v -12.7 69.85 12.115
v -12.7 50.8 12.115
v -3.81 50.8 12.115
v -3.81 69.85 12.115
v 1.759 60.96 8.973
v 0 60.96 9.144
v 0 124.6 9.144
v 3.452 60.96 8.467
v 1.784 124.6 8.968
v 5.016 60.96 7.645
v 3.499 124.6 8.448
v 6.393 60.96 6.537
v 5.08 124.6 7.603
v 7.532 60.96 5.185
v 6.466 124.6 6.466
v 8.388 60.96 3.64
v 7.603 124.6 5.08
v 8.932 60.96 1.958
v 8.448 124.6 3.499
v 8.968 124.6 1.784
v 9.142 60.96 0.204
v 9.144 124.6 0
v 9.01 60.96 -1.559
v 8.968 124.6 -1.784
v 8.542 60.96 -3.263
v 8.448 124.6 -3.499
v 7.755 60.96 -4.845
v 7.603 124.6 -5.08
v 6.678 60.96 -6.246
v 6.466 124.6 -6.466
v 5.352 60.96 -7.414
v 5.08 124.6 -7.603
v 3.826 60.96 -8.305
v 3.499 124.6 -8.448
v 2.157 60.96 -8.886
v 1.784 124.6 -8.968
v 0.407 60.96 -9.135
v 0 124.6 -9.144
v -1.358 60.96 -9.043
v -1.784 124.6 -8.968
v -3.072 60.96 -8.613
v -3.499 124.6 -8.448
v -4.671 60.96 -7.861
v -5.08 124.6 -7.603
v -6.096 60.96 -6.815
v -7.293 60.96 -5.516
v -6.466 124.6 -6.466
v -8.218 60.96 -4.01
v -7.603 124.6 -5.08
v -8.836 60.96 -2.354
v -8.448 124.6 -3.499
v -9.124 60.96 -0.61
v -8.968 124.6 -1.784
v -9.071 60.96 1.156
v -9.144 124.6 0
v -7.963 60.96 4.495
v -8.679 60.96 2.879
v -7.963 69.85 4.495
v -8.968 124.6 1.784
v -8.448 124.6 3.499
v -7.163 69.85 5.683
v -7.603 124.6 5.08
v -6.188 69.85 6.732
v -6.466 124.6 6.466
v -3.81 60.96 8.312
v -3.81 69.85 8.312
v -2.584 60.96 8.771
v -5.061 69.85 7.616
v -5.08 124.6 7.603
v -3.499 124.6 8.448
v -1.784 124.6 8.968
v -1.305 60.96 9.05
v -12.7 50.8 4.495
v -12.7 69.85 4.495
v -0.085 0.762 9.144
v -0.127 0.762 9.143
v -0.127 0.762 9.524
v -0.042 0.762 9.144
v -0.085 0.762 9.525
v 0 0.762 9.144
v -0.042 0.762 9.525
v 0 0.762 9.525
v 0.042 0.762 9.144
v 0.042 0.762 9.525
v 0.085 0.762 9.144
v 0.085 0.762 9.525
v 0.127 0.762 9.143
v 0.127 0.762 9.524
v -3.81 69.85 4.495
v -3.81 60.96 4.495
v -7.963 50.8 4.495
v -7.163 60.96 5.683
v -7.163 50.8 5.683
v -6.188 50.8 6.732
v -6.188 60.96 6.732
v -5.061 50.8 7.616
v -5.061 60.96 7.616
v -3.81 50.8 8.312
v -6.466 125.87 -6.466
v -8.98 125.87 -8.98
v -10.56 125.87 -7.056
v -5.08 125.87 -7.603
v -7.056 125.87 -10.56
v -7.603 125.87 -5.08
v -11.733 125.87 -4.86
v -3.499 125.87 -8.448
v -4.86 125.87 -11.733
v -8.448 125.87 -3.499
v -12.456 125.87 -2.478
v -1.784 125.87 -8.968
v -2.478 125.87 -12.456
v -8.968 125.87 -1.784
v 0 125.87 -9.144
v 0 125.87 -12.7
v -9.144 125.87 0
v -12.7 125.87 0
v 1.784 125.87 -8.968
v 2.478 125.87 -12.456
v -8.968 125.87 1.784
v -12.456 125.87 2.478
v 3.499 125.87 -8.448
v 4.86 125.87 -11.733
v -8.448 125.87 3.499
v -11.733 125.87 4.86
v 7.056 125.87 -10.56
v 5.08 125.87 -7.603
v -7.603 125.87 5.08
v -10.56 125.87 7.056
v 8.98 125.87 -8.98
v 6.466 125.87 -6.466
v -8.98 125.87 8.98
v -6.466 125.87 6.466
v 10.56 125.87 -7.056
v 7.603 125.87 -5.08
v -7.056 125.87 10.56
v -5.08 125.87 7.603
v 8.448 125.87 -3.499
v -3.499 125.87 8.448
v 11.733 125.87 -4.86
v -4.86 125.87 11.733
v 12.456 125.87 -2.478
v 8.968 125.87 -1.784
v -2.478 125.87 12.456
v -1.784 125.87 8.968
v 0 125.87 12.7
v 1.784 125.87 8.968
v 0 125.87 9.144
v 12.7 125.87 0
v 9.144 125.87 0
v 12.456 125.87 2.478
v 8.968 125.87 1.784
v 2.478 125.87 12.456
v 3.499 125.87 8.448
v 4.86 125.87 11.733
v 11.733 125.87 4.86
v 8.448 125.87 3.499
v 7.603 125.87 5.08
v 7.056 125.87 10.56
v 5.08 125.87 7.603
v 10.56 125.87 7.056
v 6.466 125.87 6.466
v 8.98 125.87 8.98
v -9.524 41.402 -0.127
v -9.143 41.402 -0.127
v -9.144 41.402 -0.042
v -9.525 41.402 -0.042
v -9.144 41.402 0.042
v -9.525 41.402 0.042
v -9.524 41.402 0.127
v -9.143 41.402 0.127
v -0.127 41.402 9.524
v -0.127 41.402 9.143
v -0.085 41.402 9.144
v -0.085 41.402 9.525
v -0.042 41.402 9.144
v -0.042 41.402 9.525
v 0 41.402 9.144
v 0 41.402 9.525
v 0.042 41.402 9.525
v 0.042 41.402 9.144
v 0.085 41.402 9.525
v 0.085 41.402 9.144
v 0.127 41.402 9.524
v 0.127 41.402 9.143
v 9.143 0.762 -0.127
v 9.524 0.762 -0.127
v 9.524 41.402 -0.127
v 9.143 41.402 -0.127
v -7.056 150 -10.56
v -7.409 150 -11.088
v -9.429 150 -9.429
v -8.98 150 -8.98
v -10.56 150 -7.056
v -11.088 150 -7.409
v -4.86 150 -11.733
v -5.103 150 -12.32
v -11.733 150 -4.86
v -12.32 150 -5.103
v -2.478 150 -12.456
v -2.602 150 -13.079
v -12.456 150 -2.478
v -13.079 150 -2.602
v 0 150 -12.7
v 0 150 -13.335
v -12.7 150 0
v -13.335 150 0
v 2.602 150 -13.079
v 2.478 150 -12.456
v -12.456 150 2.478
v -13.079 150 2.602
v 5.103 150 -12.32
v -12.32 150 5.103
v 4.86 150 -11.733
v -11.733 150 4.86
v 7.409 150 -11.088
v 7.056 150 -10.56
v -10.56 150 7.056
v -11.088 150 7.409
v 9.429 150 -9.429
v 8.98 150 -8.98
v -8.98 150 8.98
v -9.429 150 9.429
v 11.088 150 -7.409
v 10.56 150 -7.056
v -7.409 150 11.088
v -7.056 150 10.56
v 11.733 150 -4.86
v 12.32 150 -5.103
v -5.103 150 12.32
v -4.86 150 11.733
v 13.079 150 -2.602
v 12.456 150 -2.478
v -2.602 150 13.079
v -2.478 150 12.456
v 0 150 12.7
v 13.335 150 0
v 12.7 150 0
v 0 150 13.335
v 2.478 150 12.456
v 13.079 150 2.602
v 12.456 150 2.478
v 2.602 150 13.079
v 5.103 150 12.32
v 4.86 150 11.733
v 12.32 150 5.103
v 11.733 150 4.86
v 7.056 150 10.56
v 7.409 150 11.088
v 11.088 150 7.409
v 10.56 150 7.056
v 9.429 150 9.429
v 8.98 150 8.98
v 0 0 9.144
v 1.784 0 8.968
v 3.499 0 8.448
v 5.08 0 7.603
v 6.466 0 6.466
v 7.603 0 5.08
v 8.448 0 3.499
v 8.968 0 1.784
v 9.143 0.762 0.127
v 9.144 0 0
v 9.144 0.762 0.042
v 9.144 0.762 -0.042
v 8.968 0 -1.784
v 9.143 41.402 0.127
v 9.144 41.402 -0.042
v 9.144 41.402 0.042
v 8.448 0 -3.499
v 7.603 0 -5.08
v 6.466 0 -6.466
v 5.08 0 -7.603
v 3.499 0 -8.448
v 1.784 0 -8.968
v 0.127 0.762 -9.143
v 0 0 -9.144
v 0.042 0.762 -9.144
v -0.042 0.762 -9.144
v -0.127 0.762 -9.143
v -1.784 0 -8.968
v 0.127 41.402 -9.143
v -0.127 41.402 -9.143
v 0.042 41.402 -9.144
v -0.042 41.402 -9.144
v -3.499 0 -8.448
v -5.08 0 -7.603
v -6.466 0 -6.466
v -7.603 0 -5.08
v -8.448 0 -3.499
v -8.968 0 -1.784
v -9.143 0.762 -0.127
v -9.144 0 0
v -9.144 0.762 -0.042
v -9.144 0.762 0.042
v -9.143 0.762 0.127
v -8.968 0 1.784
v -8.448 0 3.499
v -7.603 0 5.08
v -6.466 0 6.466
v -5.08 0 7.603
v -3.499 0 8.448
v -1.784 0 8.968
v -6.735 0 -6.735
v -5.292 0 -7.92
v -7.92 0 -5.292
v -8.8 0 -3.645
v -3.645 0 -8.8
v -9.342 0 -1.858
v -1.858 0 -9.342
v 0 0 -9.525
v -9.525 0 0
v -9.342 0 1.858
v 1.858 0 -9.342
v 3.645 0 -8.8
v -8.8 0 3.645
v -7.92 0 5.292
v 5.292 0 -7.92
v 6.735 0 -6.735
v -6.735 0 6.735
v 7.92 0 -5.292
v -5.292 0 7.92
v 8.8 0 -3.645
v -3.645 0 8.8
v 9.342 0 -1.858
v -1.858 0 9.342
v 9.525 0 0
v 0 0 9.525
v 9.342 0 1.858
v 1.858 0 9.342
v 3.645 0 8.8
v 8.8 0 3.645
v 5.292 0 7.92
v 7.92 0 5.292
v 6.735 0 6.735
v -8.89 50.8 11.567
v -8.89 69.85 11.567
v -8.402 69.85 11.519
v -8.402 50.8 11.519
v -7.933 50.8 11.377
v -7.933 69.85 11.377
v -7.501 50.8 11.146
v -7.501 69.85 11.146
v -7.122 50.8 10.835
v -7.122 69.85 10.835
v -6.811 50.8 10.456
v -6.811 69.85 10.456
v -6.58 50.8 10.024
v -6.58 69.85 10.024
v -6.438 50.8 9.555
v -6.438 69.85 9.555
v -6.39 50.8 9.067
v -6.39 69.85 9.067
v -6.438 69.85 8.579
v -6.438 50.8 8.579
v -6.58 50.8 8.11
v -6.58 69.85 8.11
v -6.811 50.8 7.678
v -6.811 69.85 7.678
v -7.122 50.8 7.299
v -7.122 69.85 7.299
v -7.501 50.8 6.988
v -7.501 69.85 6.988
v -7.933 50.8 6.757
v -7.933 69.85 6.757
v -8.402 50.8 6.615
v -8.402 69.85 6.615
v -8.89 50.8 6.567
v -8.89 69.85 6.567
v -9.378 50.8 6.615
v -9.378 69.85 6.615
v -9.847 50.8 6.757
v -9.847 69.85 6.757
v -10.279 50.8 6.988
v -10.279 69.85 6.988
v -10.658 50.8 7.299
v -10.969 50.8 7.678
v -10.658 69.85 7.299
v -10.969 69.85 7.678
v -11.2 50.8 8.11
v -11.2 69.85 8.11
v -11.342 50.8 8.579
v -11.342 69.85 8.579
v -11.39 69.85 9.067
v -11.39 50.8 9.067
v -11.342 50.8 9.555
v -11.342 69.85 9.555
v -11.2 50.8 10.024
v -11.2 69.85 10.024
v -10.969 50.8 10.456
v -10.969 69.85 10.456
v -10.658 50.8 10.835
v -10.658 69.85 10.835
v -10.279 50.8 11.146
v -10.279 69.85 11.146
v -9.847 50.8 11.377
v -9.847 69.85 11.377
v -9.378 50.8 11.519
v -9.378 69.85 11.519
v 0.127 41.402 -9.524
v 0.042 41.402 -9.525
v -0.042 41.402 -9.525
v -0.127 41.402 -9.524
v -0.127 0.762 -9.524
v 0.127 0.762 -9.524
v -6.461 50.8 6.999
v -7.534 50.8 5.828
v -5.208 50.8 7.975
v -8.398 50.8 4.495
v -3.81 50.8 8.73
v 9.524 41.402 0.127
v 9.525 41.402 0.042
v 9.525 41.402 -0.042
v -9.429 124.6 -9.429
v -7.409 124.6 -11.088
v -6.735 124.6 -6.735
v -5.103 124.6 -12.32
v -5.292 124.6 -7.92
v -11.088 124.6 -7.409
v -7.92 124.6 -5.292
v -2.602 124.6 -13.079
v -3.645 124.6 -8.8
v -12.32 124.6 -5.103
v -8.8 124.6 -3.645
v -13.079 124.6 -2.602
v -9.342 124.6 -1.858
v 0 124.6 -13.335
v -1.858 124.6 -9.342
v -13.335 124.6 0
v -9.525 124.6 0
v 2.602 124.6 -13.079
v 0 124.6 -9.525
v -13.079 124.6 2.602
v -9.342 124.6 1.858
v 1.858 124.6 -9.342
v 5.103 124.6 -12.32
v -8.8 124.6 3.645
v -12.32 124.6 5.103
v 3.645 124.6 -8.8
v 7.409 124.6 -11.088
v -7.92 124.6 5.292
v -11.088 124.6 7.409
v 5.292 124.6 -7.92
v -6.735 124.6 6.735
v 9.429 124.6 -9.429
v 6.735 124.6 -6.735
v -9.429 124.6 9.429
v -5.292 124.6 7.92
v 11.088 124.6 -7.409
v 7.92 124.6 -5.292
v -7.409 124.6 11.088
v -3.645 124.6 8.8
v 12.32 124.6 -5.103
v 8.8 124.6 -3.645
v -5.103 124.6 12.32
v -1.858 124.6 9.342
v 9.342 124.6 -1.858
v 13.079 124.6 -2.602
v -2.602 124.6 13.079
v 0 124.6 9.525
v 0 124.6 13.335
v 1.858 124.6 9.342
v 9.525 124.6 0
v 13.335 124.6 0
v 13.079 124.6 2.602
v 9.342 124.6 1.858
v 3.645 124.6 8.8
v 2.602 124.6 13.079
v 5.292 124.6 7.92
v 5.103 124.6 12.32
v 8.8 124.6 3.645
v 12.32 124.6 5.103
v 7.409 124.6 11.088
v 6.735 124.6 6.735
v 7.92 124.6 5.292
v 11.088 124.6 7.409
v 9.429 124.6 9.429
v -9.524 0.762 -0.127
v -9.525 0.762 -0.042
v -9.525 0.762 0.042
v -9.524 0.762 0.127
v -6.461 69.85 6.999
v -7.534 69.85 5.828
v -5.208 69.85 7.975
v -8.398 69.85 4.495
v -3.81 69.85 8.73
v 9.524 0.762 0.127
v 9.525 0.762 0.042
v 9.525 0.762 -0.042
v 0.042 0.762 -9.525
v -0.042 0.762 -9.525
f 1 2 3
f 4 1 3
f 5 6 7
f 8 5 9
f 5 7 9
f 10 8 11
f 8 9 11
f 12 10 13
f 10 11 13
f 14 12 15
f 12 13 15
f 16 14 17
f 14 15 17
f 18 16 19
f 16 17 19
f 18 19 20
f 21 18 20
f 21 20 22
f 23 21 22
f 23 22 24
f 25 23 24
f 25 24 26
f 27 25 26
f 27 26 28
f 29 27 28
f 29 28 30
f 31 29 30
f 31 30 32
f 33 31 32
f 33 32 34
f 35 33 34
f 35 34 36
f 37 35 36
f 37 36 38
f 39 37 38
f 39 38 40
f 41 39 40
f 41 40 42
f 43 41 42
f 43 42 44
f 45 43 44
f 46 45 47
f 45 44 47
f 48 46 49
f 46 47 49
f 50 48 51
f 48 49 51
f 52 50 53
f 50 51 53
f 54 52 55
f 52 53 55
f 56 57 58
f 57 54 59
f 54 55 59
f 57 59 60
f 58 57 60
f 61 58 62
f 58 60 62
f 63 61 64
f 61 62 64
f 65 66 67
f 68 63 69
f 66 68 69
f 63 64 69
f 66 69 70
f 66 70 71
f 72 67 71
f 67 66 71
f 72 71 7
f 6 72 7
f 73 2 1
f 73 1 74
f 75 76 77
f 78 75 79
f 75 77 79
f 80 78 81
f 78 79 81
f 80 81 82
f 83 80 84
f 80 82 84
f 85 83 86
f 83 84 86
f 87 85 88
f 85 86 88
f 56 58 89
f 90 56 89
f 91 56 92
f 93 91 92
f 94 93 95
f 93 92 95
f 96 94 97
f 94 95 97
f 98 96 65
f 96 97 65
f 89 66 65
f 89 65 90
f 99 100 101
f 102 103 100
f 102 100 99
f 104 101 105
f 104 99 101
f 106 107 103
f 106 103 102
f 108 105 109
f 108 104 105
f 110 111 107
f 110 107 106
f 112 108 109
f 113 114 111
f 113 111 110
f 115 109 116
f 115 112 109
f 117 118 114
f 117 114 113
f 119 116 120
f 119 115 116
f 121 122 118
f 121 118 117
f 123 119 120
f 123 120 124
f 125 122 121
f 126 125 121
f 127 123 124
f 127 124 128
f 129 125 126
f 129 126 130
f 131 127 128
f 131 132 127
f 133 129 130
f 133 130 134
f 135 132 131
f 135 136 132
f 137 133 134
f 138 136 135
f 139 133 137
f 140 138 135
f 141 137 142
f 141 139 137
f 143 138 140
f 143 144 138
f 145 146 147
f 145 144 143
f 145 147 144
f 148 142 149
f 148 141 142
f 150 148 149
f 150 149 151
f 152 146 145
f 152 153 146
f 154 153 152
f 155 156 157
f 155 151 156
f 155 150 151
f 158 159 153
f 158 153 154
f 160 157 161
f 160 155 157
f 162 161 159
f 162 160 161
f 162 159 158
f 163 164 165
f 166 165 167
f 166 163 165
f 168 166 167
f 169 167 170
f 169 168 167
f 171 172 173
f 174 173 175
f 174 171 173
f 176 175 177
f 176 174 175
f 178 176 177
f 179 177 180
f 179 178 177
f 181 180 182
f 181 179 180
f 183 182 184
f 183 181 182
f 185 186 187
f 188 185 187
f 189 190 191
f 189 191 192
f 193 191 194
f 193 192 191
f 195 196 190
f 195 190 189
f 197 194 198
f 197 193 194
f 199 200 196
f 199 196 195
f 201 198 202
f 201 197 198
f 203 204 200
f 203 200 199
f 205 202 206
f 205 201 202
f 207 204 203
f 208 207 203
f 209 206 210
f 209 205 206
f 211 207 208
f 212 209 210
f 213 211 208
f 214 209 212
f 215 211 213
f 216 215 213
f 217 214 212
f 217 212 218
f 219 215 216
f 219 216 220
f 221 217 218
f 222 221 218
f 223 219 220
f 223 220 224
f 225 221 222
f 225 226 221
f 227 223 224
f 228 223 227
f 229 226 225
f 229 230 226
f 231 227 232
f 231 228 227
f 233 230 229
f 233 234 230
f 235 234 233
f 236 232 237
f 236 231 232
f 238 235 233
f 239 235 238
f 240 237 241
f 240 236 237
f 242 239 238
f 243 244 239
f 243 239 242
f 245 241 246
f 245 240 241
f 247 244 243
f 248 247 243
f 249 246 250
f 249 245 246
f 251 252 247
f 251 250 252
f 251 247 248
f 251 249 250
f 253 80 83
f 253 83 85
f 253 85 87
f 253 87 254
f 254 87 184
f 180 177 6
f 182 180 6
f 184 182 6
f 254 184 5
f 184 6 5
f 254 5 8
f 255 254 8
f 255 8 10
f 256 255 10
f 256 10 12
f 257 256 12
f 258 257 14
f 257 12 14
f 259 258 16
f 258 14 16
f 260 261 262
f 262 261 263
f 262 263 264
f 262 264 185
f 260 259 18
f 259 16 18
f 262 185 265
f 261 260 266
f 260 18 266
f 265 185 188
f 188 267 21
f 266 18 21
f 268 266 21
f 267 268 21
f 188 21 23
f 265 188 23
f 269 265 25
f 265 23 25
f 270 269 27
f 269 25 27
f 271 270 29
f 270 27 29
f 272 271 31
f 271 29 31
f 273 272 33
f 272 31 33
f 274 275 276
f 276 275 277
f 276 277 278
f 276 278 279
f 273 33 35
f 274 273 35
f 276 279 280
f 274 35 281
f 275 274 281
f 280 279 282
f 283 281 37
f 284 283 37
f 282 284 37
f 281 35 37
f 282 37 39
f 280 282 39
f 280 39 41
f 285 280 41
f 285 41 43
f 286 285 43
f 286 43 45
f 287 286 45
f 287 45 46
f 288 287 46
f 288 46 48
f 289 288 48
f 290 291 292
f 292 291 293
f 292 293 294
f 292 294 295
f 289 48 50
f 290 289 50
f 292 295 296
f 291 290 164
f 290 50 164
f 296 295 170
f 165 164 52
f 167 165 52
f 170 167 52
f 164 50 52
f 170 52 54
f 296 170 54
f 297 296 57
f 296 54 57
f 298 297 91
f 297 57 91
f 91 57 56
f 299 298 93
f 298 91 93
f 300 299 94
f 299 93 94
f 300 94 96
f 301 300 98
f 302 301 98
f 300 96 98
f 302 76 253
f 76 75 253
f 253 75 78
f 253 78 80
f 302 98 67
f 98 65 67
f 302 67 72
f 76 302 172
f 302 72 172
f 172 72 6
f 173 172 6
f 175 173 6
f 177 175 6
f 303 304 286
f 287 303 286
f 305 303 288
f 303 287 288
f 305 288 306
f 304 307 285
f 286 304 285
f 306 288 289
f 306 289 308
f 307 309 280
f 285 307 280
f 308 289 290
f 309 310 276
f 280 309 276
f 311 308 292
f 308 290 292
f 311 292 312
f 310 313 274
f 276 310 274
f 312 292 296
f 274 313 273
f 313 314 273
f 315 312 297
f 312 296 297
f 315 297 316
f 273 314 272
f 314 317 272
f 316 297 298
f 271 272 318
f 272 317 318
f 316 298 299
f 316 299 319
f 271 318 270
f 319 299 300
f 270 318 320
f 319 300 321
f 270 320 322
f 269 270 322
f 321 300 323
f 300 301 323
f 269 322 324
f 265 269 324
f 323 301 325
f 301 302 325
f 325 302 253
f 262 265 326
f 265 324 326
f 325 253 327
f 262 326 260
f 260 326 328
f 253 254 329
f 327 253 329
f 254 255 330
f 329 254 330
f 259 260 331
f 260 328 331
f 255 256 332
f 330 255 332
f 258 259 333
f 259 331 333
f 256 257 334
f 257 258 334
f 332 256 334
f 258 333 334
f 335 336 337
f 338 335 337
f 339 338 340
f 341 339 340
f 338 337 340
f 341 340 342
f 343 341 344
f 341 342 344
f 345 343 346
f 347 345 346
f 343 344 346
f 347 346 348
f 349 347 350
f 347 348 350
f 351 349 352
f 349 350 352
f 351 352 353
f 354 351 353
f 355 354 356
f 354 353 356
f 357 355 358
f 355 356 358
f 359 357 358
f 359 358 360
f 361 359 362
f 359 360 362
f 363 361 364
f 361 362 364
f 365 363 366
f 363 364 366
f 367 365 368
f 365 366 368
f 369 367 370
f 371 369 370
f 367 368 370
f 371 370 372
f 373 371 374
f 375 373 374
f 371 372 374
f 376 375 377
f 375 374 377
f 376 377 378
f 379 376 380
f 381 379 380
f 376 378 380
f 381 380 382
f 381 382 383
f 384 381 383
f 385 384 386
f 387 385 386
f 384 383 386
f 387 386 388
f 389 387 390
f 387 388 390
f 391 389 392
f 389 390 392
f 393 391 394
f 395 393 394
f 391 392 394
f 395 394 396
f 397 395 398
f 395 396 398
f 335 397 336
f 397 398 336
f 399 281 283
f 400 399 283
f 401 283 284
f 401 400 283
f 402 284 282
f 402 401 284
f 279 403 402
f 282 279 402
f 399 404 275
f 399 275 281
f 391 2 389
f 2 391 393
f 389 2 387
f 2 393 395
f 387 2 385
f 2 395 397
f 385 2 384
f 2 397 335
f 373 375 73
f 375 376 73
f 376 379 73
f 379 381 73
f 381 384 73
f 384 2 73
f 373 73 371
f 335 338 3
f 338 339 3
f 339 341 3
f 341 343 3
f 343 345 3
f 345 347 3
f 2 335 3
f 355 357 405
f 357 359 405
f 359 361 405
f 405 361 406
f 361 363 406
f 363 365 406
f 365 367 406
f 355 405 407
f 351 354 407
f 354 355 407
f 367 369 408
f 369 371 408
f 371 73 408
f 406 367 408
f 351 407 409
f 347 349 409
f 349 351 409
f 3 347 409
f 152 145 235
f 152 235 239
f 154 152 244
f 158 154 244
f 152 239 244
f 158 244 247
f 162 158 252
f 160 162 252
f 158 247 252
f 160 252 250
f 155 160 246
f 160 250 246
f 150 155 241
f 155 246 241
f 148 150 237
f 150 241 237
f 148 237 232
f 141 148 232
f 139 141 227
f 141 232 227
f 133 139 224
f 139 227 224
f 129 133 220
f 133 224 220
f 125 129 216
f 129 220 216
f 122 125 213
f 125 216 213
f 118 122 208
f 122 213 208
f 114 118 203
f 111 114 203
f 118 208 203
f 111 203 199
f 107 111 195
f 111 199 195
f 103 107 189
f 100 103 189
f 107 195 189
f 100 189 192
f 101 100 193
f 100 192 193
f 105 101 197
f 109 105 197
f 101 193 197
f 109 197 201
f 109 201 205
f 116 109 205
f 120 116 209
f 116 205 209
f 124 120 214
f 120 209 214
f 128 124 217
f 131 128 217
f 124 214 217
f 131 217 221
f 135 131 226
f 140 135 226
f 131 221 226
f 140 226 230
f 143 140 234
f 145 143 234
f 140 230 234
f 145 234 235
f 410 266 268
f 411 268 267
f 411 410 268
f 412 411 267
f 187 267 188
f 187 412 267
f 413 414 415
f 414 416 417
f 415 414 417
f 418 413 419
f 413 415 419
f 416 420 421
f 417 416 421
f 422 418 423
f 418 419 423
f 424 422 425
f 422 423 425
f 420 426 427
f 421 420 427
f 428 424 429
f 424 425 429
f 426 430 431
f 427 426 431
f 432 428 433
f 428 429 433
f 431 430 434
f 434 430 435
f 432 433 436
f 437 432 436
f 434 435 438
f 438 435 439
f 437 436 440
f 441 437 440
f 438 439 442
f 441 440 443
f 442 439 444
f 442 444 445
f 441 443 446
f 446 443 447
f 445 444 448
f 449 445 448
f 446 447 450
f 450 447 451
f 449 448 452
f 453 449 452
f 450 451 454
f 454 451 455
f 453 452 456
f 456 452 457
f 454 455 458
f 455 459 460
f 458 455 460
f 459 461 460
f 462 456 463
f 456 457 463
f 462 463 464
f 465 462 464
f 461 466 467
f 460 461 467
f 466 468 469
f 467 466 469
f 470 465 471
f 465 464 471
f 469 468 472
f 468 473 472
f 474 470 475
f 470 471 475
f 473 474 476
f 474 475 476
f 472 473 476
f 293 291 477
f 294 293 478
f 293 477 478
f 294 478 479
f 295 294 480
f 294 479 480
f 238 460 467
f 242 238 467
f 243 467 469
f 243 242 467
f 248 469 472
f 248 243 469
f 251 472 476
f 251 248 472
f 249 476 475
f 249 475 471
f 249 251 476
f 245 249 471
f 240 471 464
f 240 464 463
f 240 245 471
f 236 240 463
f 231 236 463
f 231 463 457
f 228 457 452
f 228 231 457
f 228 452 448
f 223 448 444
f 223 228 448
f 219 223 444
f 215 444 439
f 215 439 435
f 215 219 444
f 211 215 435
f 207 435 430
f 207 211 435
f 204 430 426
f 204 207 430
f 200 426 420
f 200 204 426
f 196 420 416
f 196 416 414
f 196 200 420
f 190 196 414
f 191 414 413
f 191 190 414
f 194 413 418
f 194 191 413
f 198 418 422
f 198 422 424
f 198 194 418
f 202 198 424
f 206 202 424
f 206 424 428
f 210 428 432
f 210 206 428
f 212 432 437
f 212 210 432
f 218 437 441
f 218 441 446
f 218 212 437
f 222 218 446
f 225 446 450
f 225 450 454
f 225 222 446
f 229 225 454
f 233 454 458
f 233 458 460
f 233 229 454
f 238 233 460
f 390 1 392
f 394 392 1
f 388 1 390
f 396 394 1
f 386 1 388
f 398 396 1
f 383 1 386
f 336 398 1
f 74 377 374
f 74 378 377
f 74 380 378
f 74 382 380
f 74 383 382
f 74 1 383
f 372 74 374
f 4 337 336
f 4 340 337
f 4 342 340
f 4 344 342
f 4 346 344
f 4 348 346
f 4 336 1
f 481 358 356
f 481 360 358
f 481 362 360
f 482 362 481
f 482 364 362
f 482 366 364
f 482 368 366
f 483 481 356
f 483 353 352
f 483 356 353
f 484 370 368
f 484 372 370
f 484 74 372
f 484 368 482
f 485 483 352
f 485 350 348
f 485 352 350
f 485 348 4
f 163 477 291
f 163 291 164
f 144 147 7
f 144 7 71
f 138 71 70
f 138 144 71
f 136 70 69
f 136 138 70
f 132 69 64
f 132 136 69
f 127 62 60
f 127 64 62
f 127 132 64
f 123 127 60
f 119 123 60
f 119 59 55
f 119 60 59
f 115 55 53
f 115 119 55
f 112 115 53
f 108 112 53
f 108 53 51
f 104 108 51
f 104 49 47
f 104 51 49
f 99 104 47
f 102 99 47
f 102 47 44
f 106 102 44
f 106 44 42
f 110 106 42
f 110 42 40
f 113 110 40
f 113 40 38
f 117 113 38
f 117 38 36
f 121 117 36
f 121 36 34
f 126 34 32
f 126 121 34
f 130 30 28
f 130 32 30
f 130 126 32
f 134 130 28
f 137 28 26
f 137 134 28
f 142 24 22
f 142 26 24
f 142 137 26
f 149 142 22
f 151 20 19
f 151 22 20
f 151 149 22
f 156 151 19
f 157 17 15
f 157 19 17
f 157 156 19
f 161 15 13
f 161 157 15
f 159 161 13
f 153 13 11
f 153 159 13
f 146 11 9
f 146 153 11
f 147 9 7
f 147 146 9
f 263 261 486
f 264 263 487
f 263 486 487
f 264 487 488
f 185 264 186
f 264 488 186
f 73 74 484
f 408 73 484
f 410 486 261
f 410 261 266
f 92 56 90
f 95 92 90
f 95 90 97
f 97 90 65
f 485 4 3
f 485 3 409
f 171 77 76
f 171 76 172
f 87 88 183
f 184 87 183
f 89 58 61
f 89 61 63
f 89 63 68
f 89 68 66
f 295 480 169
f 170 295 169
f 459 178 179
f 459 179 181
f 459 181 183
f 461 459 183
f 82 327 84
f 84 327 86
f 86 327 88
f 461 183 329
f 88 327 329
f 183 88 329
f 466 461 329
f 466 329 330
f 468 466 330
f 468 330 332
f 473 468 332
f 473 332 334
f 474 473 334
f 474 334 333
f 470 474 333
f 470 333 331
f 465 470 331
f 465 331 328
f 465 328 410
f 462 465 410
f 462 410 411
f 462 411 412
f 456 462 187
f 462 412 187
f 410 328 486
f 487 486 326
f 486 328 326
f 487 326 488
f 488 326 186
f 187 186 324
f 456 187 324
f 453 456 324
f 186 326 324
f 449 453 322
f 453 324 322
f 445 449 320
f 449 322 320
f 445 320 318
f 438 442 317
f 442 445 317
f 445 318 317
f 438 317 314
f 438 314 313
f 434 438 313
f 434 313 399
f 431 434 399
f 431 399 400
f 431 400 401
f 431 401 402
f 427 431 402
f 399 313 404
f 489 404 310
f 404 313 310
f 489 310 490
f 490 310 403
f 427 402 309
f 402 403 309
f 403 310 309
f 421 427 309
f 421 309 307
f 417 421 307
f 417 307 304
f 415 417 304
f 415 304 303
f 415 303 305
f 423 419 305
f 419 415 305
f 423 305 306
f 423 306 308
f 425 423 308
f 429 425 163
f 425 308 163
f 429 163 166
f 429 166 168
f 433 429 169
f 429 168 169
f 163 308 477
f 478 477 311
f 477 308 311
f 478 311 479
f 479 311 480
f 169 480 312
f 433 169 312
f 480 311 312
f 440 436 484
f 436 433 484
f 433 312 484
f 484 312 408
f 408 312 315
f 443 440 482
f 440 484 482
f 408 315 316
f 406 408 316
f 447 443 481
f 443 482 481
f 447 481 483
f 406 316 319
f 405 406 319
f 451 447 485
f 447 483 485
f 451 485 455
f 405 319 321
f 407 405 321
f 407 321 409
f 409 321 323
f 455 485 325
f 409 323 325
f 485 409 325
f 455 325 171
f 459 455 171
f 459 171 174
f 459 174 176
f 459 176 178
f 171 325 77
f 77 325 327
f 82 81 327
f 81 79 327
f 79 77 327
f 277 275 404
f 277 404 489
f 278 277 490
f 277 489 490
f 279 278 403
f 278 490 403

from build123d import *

# Parameters (mm, degrees)
SKETCH1_R           = 9.525
BOSS_EXTRUDE1_DEPTH = 150
SKETCH2_R           = 9.144
CUT_EXTRUDE1_DEPTH  = 177.8
CUT_EXTRUDE3_START  = 10.16
SKETCH3_W           = 0.254
SKETCH3_H           = 40.64
CUT_EXTRUDE3_DEPTH  = 1.27
CIRPATTERN1_COUNT   = 4
SKETCH9_R           = 13.335
BOSS_EXTRUDE2_DEPTH = 25.4
SKETCH10_R          = 12.7
CUT_EXTRUDE5_DEPTH  = 24.13
CUT_EXTRUDE6_START  = -24.13
SKETCH11_R          = 9.144
CUT_EXTRUDE6_DEPTH  = 24.13
BOSS_EXTRUDE3_START = 50.8
SKETCH12_W          = 8.89
SKETCH12_H          = 7.62
BOSS_EXTRUDE3_DEPTH = 19.05
SKETCH13_R          = 2.5
CUT_EXTRUDE7_DEPTH  = 19.05
CUT_EXTRUDE8_START  = 60.96
SKETCH14_R          = 9.144
CUT_EXTRUDE8_DEPTH  = 60.96


with BuildPart() as part:
    # Sketch1 → Boss-Extrude1 (new body)
    with BuildSketch(Plane(origin=(0, 0, 0), x_dir=(1, 0, 0), z_dir=(0, 1, 0))):
        with Locations(Location((0, 0, 0), (0, 0, 270))):
            Circle(SKETCH1_R)
    extrude(amount=BOSS_EXTRUDE1_DEPTH)

    # Sketch2 → Cut-Extrude1 (cut)
    with BuildSketch(Plane(origin=(0, 150, 0), x_dir=(1, 0, 0), z_dir=(0, 1, 0))):
        with Locations(Location((0, 0, 0), (0, 0, 270))):
            Circle(SKETCH2_R)
    extrude(amount=-CUT_EXTRUDE1_DEPTH, mode=Mode.SUBTRACT)

    # Sketch3 → Cut-Extrude3 (cut)
    with BuildSketch(Plane(origin=(0, 0, 0), x_dir=(0, 0, -1), z_dir=(1, 0, 0)).offset(CUT_EXTRUDE3_START)):
        with Locations((0, 21.082)):
            Rectangle(SKETCH3_W, SKETCH3_H)
    cut_extrude3 = extrude(amount=-CUT_EXTRUDE3_DEPTH, mode=Mode.SUBTRACT)

    # CirPattern1: Cut-Extrude3 ×4 about axis
    cirpattern1_axis = Axis((0, 0, 0), (0, 1, 0))
    for i in range(1, CIRPATTERN1_COUNT):
        add(cut_extrude3.rotate(cirpattern1_axis, i * 360 / CIRPATTERN1_COUNT), mode=Mode.SUBTRACT)

    # Sketch9 → Boss-Extrude2 (add)
    with BuildSketch(Plane(origin=(0, 150, 0), x_dir=(1, 0, 0), z_dir=(0, 1, 0))):
        with Locations(Location((0, 0, 0), (0, 0, 270))):
            Circle(SKETCH9_R)
    extrude(amount=-BOSS_EXTRUDE2_DEPTH)

    # Sketch10 → Cut-Extrude5 (cut)
    with BuildSketch(Plane(origin=(0, 150, 0), x_dir=(1, 0, 0), z_dir=(0, 1, 0))):
        with Locations(Location((0, 0, 0), (0, 0, 270))):
            Circle(SKETCH10_R)
    extrude(amount=-CUT_EXTRUDE5_DEPTH, mode=Mode.SUBTRACT)

    # Sketch11 → Cut-Extrude6 (cut)
    with BuildSketch(Plane.XZ.offset(-124.6).offset(CUT_EXTRUDE6_START)):
        with Locations(Location((0, 0, 0), (0, 0, 90))):
            Circle(SKETCH11_R)
    extrude(amount=CUT_EXTRUDE6_DEPTH, mode=Mode.SUBTRACT)

    # Sketch12 → Boss-Extrude3 (add)
    with BuildSketch(Plane(origin=(0, 0, 0), x_dir=(1, 0, 0), z_dir=(0, 1, 0)).offset(BOSS_EXTRUDE3_START)):
        with Locations((-8.255, -8.305027858)):
            Rectangle(SKETCH12_W, SKETCH12_H)
    extrude(amount=BOSS_EXTRUDE3_DEPTH)

    # Sketch13 → Cut-Extrude7 (cut)
    with BuildSketch(Plane(origin=(0, 69.85, 0), x_dir=(1, 0, 0), z_dir=(0, 1, 0))):
        with Locations(Location((-8.89, -9.067027858, 0), (0, 0, 270))):
            Circle(SKETCH13_R)
    extrude(amount=-CUT_EXTRUDE7_DEPTH, mode=Mode.SUBTRACT)

    # Sketch14 → Cut-Extrude8 (cut)
    with BuildSketch(Plane(origin=(0, 0, 0), x_dir=(1, 0, 0), z_dir=(0, 1, 0)).offset(CUT_EXTRUDE8_START)):
        with Locations(Location((0, 0, 0), (0, 0, 270))):
            Circle(SKETCH14_R)
    extrude(amount=-CUT_EXTRUDE8_DEPTH, mode=Mode.SUBTRACT)


solid = part.part
